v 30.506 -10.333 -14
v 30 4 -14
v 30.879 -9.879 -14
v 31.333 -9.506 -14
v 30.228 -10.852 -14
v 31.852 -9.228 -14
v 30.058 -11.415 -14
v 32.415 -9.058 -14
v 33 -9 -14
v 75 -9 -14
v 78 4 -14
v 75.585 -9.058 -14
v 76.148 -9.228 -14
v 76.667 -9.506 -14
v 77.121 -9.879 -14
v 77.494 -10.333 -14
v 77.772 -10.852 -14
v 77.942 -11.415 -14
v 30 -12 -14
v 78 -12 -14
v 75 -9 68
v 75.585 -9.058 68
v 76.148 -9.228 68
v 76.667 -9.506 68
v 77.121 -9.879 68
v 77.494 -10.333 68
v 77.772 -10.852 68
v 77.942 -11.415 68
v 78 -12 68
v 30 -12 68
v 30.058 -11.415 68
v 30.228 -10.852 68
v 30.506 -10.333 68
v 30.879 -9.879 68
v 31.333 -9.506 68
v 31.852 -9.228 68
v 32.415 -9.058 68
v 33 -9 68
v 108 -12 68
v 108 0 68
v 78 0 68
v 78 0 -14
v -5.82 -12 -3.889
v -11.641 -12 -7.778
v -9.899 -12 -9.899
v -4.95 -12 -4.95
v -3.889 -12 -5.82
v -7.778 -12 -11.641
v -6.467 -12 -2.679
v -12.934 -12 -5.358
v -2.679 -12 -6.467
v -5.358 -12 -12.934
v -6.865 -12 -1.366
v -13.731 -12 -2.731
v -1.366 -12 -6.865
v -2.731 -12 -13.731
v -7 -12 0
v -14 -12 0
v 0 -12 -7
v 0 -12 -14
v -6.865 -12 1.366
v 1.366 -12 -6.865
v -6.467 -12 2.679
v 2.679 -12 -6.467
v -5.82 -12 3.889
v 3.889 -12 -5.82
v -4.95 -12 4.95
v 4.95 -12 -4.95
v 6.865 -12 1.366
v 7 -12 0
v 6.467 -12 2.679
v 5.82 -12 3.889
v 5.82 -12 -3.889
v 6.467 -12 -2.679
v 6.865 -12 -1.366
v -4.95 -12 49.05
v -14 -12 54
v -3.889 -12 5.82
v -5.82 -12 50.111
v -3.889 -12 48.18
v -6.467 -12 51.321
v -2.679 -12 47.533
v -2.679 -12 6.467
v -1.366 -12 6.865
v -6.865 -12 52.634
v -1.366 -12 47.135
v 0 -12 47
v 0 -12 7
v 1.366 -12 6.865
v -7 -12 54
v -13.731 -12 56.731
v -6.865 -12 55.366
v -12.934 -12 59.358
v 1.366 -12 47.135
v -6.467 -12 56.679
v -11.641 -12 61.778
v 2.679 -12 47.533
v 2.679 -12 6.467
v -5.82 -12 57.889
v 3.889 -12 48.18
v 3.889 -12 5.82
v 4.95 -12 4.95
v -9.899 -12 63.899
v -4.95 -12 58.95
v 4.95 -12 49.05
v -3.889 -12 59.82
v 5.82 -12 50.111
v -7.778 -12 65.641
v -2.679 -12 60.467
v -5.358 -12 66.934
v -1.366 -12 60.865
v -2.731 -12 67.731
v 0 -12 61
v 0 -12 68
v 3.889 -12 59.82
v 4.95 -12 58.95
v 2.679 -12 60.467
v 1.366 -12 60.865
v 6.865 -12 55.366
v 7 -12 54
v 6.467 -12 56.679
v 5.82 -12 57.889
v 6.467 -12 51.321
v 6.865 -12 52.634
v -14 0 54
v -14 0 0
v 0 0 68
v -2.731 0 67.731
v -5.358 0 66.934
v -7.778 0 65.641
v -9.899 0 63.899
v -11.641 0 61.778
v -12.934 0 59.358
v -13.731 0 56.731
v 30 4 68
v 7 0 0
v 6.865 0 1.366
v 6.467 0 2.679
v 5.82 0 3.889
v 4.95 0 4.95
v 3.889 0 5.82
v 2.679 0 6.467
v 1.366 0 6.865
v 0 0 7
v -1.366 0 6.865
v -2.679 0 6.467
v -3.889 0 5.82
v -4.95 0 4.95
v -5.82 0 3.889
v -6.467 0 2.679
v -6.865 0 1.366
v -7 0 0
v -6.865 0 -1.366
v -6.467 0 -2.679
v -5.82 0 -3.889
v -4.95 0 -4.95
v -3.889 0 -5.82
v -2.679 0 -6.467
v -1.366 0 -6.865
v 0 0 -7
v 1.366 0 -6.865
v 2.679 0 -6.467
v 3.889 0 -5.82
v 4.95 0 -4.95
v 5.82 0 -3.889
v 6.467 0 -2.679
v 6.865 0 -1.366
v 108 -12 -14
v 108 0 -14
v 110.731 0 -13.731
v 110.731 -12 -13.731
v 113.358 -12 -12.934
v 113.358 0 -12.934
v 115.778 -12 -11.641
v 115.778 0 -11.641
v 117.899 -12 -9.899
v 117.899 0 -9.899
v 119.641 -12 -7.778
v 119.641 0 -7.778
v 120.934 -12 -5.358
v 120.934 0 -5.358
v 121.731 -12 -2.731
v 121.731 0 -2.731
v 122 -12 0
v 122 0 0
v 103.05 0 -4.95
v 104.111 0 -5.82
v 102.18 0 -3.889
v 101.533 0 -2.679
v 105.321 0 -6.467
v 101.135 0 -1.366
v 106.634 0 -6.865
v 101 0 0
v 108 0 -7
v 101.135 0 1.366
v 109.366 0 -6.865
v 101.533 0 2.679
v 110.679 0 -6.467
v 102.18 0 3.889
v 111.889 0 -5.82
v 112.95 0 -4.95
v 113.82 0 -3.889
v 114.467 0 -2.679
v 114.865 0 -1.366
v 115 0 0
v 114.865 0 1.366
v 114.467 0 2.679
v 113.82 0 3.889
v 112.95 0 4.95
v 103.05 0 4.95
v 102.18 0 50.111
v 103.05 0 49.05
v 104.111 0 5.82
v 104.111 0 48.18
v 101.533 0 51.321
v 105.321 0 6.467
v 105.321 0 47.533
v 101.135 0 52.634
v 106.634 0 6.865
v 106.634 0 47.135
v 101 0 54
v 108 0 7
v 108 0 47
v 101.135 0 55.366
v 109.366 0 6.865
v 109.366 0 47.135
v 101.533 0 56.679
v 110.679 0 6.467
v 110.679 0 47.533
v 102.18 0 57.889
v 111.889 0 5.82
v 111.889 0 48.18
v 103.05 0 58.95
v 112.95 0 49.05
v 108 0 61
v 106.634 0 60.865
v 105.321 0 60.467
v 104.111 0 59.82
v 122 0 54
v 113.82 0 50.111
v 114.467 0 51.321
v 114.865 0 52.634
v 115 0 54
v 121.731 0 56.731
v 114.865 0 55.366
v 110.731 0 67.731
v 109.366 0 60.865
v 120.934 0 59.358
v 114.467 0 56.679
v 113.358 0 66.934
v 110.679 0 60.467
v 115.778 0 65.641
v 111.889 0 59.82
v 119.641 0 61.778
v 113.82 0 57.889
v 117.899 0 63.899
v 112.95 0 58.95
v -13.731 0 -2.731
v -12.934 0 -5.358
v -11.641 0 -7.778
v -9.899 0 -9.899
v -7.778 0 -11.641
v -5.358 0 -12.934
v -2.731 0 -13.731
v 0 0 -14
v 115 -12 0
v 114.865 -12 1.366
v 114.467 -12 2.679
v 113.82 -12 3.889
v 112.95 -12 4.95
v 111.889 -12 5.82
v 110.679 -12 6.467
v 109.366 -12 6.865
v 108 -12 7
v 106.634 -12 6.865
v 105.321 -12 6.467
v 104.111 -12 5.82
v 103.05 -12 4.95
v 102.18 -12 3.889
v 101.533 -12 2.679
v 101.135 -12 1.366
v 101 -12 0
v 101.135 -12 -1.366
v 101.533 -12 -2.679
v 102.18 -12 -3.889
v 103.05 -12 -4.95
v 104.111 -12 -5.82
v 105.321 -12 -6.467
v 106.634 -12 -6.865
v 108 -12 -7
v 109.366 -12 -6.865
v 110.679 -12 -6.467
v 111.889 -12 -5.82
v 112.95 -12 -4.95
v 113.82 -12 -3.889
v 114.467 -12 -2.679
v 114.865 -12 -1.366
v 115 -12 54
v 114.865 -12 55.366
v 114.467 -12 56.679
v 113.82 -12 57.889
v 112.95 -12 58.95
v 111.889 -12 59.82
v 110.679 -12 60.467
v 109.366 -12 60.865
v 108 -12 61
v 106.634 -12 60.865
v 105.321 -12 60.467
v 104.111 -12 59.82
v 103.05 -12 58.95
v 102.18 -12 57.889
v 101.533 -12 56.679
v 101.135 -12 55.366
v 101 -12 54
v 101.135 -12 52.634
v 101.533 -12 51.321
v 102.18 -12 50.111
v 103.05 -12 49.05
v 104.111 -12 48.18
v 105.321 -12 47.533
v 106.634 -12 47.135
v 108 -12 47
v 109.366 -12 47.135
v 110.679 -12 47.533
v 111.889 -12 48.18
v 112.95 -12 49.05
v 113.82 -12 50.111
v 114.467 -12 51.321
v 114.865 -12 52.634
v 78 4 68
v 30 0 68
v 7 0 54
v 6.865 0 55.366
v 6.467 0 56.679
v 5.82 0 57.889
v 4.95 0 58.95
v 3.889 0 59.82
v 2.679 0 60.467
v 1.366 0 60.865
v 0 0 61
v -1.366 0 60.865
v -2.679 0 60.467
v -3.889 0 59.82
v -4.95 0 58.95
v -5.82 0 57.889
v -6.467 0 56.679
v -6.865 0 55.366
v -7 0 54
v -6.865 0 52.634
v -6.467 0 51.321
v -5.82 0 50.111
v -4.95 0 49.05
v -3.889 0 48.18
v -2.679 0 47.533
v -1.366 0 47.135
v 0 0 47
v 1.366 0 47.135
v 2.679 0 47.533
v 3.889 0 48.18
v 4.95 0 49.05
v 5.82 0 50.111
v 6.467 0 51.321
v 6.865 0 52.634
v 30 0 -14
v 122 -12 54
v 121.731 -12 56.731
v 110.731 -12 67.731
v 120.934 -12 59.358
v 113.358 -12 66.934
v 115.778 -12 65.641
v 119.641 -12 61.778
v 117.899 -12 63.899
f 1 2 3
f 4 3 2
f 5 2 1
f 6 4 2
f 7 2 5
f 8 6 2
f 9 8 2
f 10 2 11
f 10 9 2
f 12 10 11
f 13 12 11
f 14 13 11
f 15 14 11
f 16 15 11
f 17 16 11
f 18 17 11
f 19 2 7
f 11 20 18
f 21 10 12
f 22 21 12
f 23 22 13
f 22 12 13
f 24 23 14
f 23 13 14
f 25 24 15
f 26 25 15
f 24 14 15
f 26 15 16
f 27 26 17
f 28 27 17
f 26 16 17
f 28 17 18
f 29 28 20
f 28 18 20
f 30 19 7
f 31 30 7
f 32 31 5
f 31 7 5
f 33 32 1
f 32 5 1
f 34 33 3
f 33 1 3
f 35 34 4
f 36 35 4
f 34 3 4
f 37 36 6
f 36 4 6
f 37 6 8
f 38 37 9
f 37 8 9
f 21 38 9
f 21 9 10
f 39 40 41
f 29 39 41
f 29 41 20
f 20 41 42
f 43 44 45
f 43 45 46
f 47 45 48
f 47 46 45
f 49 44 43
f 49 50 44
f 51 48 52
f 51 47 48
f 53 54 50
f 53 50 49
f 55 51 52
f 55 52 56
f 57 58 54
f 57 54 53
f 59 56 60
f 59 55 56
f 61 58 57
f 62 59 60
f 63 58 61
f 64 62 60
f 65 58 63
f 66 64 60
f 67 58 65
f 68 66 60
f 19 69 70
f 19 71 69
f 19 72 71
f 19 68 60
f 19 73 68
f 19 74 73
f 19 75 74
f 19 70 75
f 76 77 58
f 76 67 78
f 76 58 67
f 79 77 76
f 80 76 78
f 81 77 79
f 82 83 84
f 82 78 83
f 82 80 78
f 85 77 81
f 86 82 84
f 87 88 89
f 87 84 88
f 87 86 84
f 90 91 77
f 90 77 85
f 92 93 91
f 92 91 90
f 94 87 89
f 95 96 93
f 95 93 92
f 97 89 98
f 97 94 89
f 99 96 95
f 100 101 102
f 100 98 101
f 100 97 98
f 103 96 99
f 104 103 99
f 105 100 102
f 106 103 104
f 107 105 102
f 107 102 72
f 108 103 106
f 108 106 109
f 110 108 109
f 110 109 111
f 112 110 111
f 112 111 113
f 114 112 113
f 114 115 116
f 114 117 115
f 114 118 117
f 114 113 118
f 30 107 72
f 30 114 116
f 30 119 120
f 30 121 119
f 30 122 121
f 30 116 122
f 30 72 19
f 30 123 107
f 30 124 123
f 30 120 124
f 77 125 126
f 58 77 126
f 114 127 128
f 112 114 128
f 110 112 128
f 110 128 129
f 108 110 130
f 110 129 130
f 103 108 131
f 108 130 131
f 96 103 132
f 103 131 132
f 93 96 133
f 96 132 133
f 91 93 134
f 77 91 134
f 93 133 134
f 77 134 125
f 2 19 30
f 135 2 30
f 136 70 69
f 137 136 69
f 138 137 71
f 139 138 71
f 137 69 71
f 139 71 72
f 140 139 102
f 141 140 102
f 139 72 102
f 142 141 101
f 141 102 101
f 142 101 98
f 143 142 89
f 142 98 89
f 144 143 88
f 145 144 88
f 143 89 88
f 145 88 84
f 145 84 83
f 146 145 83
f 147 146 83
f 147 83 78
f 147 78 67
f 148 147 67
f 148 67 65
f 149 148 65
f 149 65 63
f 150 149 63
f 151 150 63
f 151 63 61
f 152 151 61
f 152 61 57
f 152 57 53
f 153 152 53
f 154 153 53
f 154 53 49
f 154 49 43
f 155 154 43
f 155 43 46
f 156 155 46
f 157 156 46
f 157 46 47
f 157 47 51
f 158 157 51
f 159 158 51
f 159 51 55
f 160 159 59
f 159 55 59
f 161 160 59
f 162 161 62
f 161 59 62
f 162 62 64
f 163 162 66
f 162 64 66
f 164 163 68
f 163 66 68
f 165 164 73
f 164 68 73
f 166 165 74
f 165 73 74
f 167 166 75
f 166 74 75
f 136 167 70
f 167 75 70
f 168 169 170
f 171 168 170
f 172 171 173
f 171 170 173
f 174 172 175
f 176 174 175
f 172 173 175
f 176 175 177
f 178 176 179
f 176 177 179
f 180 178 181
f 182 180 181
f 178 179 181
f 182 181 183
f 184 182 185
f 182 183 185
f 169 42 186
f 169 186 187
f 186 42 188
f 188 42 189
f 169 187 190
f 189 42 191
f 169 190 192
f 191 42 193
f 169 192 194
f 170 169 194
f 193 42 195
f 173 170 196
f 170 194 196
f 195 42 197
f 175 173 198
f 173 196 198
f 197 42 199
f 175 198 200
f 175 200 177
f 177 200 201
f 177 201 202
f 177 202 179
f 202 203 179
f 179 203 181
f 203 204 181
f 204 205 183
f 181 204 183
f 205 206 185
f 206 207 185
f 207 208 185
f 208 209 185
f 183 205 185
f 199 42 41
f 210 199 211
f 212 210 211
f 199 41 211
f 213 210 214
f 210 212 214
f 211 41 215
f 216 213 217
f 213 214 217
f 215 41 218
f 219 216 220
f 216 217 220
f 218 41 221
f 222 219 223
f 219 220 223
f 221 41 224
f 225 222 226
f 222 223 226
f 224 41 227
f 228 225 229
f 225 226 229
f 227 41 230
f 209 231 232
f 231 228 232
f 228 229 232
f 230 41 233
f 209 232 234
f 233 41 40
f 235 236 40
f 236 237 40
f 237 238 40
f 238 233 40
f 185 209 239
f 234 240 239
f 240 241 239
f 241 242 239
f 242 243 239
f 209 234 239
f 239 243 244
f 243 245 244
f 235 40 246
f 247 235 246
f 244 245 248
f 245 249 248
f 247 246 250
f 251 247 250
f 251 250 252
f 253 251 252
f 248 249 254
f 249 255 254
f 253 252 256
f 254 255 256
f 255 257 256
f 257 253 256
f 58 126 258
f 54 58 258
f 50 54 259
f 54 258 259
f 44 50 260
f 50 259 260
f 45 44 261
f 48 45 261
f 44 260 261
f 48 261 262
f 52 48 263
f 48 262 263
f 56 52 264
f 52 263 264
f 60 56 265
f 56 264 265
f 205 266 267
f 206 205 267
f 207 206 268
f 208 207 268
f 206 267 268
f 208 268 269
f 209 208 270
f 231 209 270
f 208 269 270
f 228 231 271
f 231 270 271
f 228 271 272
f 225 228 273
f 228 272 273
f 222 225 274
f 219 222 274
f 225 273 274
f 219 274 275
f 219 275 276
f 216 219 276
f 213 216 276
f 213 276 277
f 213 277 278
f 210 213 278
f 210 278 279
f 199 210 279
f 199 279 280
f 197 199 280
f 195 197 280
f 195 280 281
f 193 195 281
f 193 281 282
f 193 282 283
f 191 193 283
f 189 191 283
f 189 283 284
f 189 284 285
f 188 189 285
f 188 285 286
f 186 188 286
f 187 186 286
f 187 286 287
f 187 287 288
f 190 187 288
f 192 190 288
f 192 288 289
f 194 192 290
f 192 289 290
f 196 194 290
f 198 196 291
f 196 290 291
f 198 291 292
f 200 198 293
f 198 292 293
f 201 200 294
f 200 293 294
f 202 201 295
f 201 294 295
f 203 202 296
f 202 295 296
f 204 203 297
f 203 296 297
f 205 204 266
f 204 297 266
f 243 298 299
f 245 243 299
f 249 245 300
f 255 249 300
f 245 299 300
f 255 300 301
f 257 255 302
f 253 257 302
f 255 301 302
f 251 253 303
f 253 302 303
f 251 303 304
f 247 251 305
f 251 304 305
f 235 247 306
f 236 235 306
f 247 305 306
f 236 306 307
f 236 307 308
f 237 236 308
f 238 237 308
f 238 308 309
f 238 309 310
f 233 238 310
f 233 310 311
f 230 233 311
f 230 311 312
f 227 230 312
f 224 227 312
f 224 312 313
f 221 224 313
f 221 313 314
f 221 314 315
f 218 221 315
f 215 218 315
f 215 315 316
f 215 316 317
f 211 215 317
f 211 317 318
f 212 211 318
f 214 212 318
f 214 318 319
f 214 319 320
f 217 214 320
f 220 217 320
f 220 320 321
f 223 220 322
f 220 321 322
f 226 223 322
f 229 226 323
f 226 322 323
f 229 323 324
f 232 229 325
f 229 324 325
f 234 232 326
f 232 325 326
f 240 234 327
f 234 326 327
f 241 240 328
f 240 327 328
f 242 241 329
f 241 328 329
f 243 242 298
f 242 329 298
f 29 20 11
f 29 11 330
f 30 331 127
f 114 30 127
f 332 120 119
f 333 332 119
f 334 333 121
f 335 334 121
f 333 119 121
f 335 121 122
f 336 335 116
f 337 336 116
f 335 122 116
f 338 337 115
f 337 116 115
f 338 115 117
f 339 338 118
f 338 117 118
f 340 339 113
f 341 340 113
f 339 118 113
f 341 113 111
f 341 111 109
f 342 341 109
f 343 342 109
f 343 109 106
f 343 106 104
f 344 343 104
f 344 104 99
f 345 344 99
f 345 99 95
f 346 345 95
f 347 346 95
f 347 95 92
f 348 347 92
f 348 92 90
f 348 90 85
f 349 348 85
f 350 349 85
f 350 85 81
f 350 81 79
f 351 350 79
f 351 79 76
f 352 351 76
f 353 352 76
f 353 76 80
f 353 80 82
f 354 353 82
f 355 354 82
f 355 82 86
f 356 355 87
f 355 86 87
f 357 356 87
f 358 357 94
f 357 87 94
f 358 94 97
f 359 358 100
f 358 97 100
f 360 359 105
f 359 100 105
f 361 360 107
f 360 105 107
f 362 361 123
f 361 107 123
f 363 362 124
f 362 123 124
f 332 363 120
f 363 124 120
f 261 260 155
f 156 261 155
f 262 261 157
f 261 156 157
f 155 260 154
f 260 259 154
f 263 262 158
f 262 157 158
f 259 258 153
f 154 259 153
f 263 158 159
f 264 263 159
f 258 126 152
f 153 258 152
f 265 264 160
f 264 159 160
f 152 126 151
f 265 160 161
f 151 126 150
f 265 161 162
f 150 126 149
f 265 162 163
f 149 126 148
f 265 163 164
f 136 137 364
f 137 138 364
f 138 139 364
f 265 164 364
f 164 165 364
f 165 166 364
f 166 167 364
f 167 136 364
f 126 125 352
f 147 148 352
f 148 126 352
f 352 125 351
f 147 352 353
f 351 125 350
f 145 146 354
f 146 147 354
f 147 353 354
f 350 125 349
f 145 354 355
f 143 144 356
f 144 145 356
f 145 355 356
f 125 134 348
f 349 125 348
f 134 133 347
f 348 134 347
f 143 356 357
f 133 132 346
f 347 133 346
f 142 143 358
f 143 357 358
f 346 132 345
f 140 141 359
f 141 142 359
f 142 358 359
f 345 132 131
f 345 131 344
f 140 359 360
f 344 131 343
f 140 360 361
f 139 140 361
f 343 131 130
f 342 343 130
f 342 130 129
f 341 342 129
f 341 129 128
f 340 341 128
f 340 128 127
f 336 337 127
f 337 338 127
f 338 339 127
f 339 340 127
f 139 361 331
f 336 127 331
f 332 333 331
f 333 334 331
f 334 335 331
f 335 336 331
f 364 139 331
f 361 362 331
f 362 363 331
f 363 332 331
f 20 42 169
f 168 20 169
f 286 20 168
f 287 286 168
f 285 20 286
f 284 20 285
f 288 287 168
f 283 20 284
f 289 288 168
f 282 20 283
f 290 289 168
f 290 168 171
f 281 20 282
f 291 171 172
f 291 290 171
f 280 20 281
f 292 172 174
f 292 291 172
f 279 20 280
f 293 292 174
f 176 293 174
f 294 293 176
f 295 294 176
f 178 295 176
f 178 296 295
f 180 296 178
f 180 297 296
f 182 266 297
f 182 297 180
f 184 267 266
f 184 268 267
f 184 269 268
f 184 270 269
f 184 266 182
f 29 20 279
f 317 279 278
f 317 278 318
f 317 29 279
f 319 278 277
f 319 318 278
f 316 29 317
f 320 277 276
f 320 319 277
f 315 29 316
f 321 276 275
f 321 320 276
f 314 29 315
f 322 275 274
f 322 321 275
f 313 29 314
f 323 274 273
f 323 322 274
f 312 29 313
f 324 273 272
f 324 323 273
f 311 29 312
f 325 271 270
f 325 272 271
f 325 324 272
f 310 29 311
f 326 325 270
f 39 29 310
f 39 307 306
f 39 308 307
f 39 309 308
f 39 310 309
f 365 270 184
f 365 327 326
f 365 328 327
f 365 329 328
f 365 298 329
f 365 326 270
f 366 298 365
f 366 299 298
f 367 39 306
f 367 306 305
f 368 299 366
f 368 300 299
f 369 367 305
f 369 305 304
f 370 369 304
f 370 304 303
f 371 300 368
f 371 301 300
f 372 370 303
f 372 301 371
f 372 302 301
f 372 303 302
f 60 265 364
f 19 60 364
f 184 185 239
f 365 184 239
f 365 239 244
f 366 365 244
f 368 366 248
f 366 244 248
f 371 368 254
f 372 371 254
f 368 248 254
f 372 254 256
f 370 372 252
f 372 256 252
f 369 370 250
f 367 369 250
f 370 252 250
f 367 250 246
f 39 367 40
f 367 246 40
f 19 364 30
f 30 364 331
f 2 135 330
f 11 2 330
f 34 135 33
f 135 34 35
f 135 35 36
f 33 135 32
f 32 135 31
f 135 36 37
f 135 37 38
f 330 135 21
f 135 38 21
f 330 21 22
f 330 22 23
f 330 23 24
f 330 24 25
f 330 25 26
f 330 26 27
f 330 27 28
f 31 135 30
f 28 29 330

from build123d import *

# Parameters (mm, degrees)
F1_DEPTH      = 12
F0_W          = 48
F0_H          = 82
F2_DEPTH      = 12
F2_DEPTH_BACK = 4
F3_R          = 7
F4_DEPTH      = 16.001
F5_DEPTH      = 25
F7_DEPTH      = 82.001


with BuildPart() as f1:
    # F0 (on Front) → F1 (new body)
    with BuildSketch(Plane.XZ):
        with BuildLine():
            Line((-14, 54), (-14, 0))
            ThreePointArc((-14, 0), (-9.8994949366, -9.8994949366), (0, -14))
            Line((0, -14), (30, -14))
            Line((30, -14), (30, 68))
            Line((30, 68), (0, 68))
            ThreePointArc((0, 68), (-9.8994949366, 63.8994949366), (-14, 54))
        make_face()
    extrude(amount=F1_DEPTH)


with BuildPart() as f1b:
    # F0 (on Front) → F1, piece 2 (new body)
    with BuildSketch(Plane.XZ):
        with BuildLine():
            Line((78, 68), (78, -14))
            Line((78, -14), (108, -14))
            ThreePointArc((108, -14), (117.8994949366, -9.8994949366), (122, 0))
            Line((122, 0), (122, 54))
            ThreePointArc((122, 54), (117.8994949366, 63.8994949366), (108, 68))
            Line((108, 68), (78, 68))
        make_face()
    extrude(amount=F1_DEPTH)


with BuildPart() as f2:
    # F0 (on Front) → F2 (new body, two sides)
    with BuildSketch(Plane.XZ) as f2_sk:
        with Locations((54, 27)):
            Rectangle(F0_W, F0_H)
    extrude(amount=F2_DEPTH)
    extrude(f2_sk.sketch, amount=-F2_DEPTH_BACK)

    # F6 (on face) → F7 (cut, through all)
    with BuildSketch(Plane(origin=(0, 0, -14), x_dir=(1, 0, 0), z_dir=(0, 0, -1))):
        with BuildLine():
            Line((78, 12), (30, 12))
            ThreePointArc((30, 12), (30.8786796564, 9.8786796564), (33, 9))
            Line((33, 9), (75, 9))
            ThreePointArc((75, 9), (77.1213203436, 9.8786796564), (78, 12))
        make_face()
    extrude(amount=-F7_DEPTH, mode=Mode.SUBTRACT)


with BuildPart() as f4_tool:
    # F3 (on face) → F4 (new body, through all)
    with BuildSketch(Plane.XZ.offset(12)):
        Circle(F3_R)
        with Locations((0, 54)):
            Circle(F3_R)
        with Locations((108, 54)):
            Circle(F3_R)
        with Locations((108, 0)):
            Circle(F3_R)
    extrude(amount=-F4_DEPTH)


with BuildPart() as f1_1:
    add(f1.part)

    # F4: cut by f4_tool
    add(f4_tool.part, mode=Mode.SUBTRACT)

    # F3 (on face) → F5 (cut)
    with BuildSketch(Plane.XZ.offset(12)):
        with Locations((108, 54)):
            Circle(F3_R)
        with Locations((108, 0)):
            Circle(F3_R)
    extrude(amount=-F5_DEPTH, mode=Mode.SUBTRACT)


with BuildPart() as f1b_1:
    add(f1b.part)

    # F4: cut by f4_tool
    add(f4_tool.part, mode=Mode.SUBTRACT)


solid = Compound([f2.part, f1_1.part, f1b_1.part])
